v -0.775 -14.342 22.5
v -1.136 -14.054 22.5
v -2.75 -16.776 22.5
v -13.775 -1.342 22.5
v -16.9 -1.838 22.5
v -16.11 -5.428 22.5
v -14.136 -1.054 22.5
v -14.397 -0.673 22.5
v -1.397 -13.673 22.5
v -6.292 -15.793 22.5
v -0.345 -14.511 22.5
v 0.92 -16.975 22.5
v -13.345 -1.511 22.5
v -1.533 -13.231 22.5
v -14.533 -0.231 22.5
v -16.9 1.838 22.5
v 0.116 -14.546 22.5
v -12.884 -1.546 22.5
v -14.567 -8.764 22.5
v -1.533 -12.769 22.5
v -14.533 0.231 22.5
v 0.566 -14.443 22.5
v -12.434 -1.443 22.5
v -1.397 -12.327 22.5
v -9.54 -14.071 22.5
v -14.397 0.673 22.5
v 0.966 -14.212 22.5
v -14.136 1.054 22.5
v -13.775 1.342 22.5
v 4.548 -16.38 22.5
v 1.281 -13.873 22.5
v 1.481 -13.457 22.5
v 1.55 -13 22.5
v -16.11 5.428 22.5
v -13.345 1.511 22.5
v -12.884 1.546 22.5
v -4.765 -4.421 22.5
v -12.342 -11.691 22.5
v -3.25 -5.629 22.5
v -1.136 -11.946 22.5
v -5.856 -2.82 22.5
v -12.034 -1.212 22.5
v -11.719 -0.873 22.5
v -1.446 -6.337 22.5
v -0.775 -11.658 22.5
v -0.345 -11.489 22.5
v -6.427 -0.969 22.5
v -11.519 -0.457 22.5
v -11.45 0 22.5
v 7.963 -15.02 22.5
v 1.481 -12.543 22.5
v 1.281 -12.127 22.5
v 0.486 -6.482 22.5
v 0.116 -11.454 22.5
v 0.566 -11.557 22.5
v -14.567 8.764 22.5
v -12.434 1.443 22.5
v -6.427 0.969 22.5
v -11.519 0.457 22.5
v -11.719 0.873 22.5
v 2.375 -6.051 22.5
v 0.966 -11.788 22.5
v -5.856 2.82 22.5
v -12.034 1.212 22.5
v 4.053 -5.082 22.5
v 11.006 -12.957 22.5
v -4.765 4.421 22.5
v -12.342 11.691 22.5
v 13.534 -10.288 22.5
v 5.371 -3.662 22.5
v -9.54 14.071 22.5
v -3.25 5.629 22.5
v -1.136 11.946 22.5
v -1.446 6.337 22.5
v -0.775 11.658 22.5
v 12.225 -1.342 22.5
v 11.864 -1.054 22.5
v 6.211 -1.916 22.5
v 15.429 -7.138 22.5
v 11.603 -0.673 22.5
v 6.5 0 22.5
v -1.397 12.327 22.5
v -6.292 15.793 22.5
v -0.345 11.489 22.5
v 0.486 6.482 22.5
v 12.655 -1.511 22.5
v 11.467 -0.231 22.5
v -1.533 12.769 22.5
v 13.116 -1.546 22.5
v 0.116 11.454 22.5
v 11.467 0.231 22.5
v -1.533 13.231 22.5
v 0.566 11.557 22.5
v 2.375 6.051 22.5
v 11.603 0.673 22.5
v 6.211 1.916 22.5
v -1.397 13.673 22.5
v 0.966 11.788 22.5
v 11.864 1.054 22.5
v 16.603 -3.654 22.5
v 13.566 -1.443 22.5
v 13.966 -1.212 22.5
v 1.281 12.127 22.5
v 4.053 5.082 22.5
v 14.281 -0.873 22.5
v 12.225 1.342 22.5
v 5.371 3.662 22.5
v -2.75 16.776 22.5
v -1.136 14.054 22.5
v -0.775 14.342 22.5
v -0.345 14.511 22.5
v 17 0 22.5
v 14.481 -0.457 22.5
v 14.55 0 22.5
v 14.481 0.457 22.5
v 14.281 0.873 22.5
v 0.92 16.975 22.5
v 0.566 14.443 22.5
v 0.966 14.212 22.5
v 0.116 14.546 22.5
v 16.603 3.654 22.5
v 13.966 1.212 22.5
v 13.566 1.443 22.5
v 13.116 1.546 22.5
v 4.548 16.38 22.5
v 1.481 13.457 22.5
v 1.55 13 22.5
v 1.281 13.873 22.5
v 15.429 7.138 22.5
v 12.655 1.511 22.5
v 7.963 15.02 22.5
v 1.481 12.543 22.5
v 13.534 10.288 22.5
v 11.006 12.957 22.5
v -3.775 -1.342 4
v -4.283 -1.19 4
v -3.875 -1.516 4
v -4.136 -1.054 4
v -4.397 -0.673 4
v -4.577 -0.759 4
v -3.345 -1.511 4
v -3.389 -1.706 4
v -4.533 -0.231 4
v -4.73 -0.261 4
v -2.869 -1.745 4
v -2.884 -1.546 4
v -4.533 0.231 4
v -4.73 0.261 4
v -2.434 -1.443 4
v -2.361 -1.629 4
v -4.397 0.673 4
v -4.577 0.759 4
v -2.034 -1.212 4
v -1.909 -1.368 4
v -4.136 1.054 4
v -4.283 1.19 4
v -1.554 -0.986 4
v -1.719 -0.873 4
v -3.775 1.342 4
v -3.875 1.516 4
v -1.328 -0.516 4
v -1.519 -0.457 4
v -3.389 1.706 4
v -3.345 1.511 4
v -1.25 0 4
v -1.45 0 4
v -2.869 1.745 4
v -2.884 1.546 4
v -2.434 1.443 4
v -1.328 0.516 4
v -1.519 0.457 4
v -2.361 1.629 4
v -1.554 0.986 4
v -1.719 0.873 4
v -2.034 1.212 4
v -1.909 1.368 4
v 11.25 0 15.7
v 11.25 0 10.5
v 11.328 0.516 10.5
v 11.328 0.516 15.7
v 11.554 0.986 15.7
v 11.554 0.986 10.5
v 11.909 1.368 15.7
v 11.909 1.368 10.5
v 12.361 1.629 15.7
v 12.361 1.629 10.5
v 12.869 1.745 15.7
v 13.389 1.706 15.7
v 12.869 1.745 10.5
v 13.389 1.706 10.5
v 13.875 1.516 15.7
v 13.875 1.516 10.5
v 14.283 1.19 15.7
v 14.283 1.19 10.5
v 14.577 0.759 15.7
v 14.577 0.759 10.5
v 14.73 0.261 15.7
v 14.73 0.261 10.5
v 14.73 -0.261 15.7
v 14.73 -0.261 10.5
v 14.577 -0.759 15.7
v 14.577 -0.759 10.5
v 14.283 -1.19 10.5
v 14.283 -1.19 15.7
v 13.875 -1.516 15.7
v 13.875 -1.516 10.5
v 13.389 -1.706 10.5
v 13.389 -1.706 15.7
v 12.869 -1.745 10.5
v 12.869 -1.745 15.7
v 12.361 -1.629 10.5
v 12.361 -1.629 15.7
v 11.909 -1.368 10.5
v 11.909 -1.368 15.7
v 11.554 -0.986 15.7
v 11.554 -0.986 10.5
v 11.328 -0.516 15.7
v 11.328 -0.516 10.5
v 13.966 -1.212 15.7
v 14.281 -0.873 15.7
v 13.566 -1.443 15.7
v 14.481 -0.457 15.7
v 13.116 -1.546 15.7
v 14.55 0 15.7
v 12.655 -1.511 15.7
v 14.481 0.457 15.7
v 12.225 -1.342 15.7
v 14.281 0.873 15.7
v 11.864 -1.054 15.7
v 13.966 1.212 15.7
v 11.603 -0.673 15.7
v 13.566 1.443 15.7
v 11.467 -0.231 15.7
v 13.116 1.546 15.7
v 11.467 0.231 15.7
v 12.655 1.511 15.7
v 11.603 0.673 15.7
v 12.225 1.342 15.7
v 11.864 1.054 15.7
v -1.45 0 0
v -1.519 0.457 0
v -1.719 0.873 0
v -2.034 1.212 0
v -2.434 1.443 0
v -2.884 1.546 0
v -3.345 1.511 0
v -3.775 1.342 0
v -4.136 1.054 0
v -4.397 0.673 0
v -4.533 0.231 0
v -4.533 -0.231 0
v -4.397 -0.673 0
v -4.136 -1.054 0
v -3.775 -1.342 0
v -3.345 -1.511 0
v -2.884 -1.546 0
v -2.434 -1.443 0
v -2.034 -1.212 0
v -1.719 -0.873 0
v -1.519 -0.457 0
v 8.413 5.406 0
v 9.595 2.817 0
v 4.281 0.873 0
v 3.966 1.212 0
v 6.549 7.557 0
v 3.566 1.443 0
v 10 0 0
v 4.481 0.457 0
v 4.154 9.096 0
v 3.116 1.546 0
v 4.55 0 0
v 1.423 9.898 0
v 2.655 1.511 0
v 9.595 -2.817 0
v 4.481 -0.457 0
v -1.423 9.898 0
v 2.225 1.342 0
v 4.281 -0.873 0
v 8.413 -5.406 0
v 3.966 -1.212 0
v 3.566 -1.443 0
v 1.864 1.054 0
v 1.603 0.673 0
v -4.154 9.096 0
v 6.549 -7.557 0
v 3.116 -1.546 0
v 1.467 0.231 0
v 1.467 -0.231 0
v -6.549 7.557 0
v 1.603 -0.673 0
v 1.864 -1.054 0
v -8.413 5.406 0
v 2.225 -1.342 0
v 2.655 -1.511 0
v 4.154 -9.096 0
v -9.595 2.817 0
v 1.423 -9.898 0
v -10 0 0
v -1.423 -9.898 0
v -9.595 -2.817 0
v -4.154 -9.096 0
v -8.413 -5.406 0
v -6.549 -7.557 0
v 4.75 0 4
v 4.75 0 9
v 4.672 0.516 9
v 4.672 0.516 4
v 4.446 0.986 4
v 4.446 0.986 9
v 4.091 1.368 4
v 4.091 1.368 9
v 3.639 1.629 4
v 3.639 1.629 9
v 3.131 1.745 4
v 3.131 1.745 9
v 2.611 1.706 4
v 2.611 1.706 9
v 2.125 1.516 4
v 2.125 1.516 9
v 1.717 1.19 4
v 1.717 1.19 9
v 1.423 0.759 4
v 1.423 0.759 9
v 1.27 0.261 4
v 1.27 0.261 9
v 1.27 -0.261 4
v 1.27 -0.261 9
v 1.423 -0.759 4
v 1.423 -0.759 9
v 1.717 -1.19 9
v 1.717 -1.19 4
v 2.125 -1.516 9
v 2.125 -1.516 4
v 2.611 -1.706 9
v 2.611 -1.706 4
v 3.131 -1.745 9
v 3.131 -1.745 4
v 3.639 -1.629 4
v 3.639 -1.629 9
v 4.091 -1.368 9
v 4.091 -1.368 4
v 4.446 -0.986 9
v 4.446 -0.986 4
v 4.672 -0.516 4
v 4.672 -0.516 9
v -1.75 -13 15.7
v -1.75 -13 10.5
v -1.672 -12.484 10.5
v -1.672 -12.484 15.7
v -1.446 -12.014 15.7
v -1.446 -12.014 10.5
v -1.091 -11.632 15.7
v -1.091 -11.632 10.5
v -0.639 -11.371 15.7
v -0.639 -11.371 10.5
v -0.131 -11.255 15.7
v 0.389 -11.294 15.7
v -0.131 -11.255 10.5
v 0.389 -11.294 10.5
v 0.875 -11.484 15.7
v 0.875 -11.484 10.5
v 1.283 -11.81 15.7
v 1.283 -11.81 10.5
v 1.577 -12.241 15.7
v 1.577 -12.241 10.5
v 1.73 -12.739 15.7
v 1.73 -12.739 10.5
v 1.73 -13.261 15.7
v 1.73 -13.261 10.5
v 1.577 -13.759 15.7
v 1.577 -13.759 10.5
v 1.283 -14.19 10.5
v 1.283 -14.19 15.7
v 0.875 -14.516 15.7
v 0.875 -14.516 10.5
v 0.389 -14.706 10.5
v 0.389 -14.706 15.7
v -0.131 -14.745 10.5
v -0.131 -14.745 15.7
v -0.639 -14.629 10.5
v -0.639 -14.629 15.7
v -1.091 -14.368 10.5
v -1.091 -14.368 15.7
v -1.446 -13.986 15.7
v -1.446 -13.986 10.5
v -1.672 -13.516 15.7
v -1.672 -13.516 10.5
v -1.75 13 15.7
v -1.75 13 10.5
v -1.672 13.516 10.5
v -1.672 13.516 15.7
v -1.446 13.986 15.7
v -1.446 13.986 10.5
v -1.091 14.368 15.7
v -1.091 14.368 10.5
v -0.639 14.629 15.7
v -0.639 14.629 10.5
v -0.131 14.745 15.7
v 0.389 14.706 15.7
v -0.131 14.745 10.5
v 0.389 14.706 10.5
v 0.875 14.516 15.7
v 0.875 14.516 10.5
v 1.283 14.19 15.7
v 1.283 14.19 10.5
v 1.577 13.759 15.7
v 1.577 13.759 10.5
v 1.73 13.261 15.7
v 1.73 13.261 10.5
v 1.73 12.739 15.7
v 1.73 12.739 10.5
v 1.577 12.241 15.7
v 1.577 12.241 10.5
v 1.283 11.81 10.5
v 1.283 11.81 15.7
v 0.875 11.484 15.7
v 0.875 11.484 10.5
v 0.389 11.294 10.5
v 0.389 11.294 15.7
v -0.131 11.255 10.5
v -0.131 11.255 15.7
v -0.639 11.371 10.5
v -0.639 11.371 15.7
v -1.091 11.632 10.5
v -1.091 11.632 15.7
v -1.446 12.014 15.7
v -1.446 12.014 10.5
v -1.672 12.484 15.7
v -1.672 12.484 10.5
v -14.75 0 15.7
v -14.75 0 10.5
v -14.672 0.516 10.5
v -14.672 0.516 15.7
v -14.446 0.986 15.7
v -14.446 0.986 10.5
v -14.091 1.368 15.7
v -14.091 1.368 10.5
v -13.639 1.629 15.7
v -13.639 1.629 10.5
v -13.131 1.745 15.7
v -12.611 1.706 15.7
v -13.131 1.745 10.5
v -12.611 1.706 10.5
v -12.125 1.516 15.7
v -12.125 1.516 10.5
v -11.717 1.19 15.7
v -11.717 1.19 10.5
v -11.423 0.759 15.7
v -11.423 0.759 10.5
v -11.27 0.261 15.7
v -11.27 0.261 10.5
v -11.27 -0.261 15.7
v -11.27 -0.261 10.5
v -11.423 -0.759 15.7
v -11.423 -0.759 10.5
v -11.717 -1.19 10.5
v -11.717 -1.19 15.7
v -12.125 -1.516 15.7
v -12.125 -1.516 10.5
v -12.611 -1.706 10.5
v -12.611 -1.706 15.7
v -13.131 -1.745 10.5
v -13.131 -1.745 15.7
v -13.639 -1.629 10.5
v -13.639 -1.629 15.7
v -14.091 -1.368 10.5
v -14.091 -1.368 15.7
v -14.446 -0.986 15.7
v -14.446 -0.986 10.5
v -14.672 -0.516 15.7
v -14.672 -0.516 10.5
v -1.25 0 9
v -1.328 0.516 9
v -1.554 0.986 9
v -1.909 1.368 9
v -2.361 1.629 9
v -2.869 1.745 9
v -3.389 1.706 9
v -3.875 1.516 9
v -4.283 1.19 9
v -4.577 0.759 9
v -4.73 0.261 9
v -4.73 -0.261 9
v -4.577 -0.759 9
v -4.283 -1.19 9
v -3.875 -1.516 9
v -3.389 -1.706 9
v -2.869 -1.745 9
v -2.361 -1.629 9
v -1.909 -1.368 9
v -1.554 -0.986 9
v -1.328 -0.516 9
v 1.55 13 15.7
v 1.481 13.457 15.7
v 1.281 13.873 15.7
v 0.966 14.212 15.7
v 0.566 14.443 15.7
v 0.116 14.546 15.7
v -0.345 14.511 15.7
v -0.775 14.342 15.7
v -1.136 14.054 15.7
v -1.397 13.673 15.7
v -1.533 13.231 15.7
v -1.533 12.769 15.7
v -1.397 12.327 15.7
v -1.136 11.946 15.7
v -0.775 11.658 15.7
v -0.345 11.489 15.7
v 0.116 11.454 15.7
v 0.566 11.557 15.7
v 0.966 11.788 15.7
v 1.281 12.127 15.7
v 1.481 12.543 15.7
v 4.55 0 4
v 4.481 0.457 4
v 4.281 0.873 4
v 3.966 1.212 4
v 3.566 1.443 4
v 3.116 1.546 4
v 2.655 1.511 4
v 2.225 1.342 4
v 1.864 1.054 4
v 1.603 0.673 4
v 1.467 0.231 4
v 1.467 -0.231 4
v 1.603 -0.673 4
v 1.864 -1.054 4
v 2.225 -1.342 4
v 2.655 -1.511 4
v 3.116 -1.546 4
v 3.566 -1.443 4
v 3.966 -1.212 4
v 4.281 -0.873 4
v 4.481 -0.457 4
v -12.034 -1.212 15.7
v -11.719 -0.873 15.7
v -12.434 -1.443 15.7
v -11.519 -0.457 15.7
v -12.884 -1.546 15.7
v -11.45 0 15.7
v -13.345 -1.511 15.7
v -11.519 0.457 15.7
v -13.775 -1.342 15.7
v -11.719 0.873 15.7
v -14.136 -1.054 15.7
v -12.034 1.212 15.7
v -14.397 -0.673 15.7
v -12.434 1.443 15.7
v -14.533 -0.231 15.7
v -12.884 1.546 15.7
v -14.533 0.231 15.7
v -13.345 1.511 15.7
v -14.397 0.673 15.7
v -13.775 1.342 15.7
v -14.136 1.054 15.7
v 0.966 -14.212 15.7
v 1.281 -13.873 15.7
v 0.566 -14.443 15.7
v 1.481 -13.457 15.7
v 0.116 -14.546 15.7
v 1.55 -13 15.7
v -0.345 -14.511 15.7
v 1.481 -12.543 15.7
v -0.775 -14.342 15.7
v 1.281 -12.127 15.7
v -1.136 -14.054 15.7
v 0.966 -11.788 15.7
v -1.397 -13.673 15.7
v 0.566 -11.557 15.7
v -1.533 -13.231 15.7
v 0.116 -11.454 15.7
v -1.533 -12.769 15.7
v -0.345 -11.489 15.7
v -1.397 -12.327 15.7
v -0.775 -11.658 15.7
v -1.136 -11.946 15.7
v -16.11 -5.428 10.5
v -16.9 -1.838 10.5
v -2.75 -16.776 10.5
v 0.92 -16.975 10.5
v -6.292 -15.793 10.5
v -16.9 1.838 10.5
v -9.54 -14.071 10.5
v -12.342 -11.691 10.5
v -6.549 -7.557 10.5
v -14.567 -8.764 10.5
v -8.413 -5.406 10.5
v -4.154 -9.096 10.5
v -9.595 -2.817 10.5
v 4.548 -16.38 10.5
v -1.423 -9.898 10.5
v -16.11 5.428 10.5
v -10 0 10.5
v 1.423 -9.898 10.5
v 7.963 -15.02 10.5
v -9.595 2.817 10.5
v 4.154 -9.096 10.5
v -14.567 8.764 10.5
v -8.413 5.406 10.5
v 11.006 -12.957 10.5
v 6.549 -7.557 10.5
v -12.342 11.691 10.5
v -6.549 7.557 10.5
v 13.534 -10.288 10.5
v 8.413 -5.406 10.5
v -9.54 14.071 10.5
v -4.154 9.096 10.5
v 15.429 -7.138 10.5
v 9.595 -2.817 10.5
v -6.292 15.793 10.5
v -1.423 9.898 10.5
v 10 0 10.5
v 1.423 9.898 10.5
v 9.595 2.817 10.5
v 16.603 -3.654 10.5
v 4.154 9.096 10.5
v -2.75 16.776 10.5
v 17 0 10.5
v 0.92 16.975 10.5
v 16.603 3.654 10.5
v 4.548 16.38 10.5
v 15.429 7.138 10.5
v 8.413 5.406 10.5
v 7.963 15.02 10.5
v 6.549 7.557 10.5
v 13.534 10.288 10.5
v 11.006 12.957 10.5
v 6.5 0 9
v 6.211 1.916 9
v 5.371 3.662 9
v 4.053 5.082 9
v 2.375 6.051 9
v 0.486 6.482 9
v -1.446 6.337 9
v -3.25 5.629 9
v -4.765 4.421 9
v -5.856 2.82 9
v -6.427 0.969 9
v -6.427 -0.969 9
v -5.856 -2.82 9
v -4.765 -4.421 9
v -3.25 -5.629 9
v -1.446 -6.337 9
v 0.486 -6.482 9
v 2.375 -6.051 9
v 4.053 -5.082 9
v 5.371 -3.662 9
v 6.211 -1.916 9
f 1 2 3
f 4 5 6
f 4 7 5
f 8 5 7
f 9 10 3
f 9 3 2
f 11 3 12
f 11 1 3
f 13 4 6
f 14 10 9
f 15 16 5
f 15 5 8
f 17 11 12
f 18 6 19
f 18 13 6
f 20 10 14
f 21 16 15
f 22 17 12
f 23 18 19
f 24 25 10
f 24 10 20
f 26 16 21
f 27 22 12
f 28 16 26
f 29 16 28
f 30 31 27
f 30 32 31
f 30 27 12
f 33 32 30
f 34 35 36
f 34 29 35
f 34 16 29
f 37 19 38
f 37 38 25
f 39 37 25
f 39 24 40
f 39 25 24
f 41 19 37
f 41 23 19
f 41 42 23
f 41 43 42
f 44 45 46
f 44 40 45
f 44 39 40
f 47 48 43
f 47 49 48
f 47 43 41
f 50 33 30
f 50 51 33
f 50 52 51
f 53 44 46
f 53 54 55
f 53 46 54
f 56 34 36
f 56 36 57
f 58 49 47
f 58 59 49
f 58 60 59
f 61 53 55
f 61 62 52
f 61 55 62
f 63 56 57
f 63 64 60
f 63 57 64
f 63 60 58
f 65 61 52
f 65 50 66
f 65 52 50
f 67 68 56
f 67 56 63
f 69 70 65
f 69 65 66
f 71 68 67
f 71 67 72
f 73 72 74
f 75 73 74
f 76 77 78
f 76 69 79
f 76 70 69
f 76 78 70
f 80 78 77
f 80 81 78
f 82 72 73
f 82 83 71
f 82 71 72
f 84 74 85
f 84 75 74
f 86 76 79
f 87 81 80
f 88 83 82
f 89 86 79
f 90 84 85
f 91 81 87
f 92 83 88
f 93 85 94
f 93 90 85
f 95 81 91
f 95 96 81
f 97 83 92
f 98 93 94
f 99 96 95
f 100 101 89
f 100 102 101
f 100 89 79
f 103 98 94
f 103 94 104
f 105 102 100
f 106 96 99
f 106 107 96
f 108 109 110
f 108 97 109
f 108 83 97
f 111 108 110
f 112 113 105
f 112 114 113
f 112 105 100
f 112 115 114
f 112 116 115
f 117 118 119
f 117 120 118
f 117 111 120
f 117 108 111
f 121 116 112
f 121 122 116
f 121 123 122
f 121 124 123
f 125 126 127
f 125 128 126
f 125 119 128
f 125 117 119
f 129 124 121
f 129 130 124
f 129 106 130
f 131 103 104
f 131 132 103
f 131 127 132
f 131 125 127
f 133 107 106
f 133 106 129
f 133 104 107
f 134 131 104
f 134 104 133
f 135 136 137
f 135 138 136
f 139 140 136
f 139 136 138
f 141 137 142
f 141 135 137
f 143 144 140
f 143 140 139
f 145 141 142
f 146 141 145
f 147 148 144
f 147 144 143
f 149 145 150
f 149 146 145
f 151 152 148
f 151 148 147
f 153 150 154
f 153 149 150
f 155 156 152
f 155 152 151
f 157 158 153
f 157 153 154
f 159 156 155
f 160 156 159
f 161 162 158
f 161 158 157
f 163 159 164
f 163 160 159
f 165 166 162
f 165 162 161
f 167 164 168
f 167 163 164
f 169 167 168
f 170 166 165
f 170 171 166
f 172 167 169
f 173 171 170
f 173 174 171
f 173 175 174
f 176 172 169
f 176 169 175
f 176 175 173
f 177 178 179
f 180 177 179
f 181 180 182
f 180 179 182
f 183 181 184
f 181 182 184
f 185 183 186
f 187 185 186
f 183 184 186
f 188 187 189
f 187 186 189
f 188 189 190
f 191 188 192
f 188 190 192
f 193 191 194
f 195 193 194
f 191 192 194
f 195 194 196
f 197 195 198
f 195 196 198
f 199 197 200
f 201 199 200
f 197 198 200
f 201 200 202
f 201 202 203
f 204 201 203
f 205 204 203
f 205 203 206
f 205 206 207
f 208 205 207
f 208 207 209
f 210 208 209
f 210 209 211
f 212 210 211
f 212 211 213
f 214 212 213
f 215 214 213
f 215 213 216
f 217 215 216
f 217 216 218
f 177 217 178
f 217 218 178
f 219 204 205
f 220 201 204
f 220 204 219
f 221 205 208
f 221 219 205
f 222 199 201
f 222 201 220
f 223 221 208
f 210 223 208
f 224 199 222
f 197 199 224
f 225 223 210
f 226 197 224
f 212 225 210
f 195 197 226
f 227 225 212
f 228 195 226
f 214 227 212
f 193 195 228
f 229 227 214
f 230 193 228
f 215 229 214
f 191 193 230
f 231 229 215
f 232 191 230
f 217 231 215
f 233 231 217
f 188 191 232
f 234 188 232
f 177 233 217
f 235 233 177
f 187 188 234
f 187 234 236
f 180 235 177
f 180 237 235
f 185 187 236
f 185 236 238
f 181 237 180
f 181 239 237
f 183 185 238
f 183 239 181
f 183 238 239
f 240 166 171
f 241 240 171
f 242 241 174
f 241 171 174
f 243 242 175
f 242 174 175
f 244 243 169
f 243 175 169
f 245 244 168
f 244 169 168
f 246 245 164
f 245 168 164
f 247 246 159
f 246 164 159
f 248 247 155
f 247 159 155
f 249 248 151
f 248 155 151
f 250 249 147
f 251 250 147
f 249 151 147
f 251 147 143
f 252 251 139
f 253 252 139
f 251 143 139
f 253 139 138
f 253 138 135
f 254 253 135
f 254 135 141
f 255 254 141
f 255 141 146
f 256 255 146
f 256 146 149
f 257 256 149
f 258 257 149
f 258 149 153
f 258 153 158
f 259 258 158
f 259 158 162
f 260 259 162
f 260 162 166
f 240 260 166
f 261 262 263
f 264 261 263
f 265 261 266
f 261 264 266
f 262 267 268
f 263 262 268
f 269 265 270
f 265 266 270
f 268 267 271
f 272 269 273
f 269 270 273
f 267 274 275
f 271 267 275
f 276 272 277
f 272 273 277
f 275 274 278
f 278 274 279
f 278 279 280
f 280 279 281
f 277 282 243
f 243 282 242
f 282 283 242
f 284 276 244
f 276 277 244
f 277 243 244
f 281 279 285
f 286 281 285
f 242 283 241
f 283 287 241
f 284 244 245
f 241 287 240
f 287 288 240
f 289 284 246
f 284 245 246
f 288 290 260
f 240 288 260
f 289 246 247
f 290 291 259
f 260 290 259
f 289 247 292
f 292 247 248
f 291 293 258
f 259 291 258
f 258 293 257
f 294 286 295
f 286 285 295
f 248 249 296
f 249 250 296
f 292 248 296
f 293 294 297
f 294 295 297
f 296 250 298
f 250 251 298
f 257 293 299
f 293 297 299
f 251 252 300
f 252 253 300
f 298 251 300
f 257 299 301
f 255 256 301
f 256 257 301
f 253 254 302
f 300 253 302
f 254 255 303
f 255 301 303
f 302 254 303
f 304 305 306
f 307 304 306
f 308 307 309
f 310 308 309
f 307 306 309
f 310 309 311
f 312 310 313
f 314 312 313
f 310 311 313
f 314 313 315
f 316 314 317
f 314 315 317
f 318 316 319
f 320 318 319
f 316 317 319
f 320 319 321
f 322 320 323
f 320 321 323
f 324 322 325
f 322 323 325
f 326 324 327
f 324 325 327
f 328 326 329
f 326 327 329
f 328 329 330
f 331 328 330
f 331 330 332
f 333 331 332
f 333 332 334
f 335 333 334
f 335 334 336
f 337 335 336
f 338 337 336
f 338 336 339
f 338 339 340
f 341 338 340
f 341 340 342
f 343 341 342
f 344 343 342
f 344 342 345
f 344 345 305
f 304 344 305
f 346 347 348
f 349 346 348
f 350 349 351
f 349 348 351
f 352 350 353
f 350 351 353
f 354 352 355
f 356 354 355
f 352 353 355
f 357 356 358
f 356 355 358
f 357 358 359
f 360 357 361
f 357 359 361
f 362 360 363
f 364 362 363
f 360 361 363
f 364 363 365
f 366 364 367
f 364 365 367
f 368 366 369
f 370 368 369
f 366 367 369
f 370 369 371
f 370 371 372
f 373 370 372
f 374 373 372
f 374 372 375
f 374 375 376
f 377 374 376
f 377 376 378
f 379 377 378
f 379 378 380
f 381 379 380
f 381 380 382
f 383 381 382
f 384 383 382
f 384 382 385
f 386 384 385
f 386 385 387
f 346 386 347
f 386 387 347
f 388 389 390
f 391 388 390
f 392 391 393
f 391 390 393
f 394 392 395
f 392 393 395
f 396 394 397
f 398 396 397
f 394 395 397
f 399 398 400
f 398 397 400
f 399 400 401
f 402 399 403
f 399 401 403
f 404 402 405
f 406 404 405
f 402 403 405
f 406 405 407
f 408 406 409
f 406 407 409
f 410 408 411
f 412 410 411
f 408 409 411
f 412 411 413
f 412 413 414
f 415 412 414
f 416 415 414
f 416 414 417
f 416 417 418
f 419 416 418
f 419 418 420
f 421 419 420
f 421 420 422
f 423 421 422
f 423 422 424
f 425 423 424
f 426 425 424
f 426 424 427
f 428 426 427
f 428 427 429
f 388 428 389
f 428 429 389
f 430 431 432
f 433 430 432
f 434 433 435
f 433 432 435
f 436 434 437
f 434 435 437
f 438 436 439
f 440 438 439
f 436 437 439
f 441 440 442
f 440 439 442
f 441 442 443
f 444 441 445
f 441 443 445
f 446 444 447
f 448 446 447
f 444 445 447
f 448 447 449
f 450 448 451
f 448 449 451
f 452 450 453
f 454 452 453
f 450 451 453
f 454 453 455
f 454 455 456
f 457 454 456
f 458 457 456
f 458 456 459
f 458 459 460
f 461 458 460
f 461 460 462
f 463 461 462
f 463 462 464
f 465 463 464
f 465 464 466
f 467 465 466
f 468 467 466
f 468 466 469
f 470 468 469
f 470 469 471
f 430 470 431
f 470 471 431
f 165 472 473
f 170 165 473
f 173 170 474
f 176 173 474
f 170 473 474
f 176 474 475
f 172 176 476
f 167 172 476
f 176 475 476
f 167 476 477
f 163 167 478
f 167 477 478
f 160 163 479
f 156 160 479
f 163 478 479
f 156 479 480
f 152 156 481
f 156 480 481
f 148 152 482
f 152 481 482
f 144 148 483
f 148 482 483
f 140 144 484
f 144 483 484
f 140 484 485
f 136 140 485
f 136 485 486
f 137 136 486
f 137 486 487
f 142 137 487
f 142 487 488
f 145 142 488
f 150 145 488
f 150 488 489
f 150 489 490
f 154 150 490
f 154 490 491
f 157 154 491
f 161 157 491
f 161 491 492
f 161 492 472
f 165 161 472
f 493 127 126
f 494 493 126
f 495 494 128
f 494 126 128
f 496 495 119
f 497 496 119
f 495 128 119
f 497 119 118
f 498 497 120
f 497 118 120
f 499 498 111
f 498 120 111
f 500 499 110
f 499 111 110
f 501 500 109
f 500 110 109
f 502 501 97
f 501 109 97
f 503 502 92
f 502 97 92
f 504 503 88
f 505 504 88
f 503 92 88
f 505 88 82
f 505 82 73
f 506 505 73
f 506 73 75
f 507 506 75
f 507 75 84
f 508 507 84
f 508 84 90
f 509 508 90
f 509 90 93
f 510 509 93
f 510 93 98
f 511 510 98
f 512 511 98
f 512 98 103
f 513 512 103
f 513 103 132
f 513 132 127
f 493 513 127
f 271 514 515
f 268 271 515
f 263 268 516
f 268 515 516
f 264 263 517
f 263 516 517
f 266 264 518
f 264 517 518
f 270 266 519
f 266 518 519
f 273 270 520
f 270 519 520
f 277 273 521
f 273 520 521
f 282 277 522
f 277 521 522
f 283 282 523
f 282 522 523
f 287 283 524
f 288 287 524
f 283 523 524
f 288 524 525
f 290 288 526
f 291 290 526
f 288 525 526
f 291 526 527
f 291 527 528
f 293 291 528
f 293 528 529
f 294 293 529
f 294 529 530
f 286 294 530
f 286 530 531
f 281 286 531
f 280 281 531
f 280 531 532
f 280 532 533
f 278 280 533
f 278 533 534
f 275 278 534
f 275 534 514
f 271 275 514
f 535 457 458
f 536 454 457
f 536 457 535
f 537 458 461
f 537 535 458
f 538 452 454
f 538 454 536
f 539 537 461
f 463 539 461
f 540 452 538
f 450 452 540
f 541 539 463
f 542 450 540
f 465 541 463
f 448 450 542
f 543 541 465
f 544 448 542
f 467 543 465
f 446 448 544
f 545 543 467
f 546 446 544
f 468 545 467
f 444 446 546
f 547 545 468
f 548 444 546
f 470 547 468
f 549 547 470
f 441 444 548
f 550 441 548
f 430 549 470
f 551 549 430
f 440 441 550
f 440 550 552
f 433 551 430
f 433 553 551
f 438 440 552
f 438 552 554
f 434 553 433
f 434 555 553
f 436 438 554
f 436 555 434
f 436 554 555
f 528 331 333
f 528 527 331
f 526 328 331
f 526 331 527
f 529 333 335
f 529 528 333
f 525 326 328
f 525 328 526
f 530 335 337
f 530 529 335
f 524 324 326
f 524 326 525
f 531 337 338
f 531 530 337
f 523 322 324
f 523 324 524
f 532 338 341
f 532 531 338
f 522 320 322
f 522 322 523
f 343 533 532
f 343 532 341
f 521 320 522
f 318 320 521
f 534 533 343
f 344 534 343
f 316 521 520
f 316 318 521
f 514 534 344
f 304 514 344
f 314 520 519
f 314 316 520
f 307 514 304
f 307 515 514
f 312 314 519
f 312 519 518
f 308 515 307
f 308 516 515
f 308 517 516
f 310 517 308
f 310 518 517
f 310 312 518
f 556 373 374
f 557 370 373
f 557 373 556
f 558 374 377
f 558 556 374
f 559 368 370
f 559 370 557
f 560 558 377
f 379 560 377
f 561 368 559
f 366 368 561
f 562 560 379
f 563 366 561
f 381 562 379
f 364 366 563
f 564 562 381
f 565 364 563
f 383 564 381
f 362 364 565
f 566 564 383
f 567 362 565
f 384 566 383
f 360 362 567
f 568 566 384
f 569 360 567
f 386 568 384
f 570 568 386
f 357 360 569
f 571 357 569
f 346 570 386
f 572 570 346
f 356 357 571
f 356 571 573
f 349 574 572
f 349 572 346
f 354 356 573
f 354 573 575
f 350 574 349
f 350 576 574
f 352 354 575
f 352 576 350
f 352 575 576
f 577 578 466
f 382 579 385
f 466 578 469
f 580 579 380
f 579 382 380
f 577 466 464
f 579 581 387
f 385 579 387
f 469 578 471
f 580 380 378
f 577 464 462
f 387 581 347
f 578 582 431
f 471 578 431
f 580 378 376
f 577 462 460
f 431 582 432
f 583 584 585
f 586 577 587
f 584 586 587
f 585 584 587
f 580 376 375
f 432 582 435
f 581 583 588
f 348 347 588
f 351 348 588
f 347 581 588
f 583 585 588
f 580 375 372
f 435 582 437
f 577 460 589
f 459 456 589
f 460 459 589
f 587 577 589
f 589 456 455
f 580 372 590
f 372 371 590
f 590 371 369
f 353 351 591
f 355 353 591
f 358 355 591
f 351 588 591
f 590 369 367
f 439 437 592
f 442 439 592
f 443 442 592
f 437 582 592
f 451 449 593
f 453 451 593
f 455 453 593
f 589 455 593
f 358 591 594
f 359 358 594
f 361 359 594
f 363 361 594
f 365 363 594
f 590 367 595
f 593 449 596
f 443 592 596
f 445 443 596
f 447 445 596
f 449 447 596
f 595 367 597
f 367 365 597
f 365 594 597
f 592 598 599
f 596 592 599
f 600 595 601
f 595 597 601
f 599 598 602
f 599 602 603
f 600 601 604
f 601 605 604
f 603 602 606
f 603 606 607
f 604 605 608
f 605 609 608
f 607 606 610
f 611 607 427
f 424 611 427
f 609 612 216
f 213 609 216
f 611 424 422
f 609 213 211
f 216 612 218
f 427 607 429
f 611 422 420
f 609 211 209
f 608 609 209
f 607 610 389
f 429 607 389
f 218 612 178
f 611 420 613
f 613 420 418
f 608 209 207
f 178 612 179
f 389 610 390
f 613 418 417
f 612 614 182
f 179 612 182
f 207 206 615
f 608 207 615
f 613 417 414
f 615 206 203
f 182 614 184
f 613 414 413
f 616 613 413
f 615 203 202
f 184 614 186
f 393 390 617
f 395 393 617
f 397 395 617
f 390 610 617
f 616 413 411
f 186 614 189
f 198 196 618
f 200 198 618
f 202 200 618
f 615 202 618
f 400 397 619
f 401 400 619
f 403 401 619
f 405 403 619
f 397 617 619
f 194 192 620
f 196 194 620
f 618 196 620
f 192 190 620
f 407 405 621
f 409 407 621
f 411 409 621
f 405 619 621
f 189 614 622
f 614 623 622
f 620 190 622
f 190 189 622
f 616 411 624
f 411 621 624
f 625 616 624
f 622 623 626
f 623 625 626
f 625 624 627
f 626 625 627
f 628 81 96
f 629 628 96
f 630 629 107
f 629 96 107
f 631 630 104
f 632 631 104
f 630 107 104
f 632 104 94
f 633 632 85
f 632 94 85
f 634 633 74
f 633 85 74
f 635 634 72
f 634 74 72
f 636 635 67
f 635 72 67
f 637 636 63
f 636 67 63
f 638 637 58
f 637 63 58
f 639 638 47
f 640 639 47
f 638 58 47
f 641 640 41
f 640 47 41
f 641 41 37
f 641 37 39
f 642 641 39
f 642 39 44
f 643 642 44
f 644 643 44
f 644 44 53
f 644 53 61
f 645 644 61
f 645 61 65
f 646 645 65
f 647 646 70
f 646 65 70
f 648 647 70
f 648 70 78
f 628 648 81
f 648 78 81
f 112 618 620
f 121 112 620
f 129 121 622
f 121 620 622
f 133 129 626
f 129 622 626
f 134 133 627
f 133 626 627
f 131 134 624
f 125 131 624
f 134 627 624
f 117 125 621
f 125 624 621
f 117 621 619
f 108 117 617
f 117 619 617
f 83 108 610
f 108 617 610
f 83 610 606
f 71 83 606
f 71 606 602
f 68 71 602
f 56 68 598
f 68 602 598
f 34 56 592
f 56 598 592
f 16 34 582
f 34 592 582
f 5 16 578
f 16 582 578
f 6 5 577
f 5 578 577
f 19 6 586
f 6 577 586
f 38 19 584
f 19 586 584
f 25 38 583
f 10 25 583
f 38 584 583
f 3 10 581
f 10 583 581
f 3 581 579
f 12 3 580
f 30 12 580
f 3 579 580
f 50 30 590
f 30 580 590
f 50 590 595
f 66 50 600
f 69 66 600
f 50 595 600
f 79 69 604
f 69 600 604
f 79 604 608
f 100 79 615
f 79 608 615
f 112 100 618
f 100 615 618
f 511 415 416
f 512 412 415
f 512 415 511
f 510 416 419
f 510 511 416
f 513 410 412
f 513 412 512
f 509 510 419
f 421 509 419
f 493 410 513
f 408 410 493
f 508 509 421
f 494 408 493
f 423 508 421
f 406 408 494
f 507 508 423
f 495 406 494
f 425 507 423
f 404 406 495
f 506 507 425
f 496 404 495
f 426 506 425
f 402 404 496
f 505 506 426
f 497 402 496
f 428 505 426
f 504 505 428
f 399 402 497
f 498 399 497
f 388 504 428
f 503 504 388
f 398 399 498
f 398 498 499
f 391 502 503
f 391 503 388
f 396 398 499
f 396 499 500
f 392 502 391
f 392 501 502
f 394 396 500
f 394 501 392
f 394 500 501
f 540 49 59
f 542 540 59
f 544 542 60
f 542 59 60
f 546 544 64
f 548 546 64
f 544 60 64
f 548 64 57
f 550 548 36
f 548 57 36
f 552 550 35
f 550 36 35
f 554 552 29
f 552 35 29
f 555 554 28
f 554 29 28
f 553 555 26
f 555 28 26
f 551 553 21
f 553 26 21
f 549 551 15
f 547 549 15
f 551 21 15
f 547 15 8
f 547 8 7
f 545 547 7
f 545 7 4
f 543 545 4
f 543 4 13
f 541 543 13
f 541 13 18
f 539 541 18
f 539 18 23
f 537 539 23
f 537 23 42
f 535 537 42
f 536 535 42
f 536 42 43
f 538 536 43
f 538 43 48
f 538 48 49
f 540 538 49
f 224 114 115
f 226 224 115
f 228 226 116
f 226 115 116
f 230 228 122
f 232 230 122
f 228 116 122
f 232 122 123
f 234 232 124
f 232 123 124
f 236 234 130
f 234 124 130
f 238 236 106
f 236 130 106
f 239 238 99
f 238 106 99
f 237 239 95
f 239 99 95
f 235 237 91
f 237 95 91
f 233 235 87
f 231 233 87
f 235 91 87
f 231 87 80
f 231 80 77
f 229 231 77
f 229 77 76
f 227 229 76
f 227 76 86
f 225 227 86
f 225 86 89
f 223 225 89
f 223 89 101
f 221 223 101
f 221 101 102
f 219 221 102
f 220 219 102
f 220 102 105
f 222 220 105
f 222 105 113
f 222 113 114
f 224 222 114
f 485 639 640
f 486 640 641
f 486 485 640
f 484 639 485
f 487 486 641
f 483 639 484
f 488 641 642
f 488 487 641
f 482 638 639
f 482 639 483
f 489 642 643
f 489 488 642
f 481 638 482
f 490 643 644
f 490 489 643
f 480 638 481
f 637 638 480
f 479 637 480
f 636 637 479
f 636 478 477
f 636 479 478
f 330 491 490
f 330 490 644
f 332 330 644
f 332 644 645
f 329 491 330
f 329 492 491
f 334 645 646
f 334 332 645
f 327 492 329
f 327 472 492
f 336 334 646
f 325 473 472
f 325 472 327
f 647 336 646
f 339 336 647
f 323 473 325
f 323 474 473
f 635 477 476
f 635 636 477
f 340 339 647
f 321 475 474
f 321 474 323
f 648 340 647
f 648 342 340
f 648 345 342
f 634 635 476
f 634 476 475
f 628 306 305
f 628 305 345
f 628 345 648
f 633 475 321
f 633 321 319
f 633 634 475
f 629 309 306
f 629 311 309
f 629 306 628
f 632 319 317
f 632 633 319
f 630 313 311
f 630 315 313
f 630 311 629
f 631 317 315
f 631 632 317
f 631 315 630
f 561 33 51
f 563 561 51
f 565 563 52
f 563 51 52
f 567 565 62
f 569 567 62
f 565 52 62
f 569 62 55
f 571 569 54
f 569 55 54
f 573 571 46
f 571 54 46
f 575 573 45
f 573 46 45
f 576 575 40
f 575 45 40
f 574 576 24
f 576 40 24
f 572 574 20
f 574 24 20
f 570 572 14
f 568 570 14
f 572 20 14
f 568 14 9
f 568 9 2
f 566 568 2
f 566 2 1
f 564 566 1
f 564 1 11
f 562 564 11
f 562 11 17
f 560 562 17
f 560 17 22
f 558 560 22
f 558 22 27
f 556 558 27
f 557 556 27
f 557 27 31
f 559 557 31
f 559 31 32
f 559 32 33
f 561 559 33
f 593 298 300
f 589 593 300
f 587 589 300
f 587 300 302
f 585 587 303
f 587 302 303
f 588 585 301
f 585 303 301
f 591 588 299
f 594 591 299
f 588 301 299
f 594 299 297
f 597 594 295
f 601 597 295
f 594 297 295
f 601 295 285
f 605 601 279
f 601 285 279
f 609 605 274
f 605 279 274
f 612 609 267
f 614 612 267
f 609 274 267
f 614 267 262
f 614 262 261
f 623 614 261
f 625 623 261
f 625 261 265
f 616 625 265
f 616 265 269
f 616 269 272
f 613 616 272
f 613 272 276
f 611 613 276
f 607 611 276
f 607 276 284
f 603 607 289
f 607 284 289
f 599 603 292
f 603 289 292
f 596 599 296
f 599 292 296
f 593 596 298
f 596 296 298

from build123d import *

# Parameters (mm, degrees)
SKETCH1_R           = 10
BOSS_EXTRUDE1_DEPTH = 10.5
SKETCH3_R           = 17
BOSS_EXTRUDE2_DEPTH = 12
SKETCH4_R           = 1.55
CUT_EXTRUDE3_DEPTH  = 33.927951652
SKETCH5_R           = 1.55
CUT_EXTRUDE5_DEPTH  = 33.927951652
SKETCH6_R           = 1.75
CUT_EXTRUDE6_DEPTH  = 5.2
SKETCH7_R           = 1.75
CUT_EXTRUDE7_DEPTH  = 18.5
SKETCH8_R           = 6.5
CUT_EXTRUDE8_DEPTH  = 13.5


with BuildPart() as part:
    # Sketch1 → Boss-Extrude1 (new body)
    with BuildSketch(Plane.XY):
        with Locations(Location((0, 0, 0), (0, 0, 180))):
            Circle(SKETCH1_R)
    extrude(amount=BOSS_EXTRUDE1_DEPTH)

    # Sketch3 → Boss-Extrude2 (add)
    with BuildSketch(Plane.XY.offset(10.5)):
        Circle(SKETCH3_R)
    extrude(amount=BOSS_EXTRUDE2_DEPTH)

    # Sketch4 → Cut-Extrude3 (cut, through all)
    with BuildSketch(Plane.XY.offset(22.5)):
        with Locations((3, 0)):
            Circle(SKETCH4_R)
        with Locations((-3, 0)):
            Circle(SKETCH4_R)
    extrude(amount=-CUT_EXTRUDE3_DEPTH, mode=Mode.SUBTRACT)

    # Sketch5 → Cut-Extrude5 (cut, through all)
    with BuildSketch(Plane.XY.offset(22.5)):
        with Locations((13, 0)):
            Circle(SKETCH5_R)
        with Locations((0, -13)):
            Circle(SKETCH5_R)
        with Locations((-13, 0)):
            Circle(SKETCH5_R)
        with Locations((0, 13)):
            Circle(SKETCH5_R)
    extrude(amount=-CUT_EXTRUDE5_DEPTH, mode=Mode.SUBTRACT)

    # Sketch6 → Cut-Extrude6 (cut)
    with BuildSketch(Plane(origin=(0, 0, 10.5), x_dir=(-1, 0, 0), z_dir=(0, 0, -1))):
        with Locations((13, 0)):
            Circle(SKETCH6_R)
        with Locations((0, -13)):
            Circle(SKETCH6_R)
        with Locations((-13, 0)):
            Circle(SKETCH6_R)
        with Locations((0, 13)):
            Circle(SKETCH6_R)
    extrude(amount=-CUT_EXTRUDE6_DEPTH, mode=Mode.SUBTRACT)

    # Sketch7 → Cut-Extrude7 (cut)
    with BuildSketch(Plane.XY.offset(22.5)):
        with Locations((3, 0)):
            Circle(SKETCH7_R)
        with Locations((-3, 0)):
            Circle(SKETCH7_R)
    extrude(amount=-CUT_EXTRUDE7_DEPTH, mode=Mode.SUBTRACT)

    # Sketch8 → Cut-Extrude8 (cut)
    with BuildSketch(Plane.XY.offset(22.5)):
        Circle(SKETCH8_R)
    extrude(amount=-CUT_EXTRUDE8_DEPTH, mode=Mode.SUBTRACT)


solid = part.part
